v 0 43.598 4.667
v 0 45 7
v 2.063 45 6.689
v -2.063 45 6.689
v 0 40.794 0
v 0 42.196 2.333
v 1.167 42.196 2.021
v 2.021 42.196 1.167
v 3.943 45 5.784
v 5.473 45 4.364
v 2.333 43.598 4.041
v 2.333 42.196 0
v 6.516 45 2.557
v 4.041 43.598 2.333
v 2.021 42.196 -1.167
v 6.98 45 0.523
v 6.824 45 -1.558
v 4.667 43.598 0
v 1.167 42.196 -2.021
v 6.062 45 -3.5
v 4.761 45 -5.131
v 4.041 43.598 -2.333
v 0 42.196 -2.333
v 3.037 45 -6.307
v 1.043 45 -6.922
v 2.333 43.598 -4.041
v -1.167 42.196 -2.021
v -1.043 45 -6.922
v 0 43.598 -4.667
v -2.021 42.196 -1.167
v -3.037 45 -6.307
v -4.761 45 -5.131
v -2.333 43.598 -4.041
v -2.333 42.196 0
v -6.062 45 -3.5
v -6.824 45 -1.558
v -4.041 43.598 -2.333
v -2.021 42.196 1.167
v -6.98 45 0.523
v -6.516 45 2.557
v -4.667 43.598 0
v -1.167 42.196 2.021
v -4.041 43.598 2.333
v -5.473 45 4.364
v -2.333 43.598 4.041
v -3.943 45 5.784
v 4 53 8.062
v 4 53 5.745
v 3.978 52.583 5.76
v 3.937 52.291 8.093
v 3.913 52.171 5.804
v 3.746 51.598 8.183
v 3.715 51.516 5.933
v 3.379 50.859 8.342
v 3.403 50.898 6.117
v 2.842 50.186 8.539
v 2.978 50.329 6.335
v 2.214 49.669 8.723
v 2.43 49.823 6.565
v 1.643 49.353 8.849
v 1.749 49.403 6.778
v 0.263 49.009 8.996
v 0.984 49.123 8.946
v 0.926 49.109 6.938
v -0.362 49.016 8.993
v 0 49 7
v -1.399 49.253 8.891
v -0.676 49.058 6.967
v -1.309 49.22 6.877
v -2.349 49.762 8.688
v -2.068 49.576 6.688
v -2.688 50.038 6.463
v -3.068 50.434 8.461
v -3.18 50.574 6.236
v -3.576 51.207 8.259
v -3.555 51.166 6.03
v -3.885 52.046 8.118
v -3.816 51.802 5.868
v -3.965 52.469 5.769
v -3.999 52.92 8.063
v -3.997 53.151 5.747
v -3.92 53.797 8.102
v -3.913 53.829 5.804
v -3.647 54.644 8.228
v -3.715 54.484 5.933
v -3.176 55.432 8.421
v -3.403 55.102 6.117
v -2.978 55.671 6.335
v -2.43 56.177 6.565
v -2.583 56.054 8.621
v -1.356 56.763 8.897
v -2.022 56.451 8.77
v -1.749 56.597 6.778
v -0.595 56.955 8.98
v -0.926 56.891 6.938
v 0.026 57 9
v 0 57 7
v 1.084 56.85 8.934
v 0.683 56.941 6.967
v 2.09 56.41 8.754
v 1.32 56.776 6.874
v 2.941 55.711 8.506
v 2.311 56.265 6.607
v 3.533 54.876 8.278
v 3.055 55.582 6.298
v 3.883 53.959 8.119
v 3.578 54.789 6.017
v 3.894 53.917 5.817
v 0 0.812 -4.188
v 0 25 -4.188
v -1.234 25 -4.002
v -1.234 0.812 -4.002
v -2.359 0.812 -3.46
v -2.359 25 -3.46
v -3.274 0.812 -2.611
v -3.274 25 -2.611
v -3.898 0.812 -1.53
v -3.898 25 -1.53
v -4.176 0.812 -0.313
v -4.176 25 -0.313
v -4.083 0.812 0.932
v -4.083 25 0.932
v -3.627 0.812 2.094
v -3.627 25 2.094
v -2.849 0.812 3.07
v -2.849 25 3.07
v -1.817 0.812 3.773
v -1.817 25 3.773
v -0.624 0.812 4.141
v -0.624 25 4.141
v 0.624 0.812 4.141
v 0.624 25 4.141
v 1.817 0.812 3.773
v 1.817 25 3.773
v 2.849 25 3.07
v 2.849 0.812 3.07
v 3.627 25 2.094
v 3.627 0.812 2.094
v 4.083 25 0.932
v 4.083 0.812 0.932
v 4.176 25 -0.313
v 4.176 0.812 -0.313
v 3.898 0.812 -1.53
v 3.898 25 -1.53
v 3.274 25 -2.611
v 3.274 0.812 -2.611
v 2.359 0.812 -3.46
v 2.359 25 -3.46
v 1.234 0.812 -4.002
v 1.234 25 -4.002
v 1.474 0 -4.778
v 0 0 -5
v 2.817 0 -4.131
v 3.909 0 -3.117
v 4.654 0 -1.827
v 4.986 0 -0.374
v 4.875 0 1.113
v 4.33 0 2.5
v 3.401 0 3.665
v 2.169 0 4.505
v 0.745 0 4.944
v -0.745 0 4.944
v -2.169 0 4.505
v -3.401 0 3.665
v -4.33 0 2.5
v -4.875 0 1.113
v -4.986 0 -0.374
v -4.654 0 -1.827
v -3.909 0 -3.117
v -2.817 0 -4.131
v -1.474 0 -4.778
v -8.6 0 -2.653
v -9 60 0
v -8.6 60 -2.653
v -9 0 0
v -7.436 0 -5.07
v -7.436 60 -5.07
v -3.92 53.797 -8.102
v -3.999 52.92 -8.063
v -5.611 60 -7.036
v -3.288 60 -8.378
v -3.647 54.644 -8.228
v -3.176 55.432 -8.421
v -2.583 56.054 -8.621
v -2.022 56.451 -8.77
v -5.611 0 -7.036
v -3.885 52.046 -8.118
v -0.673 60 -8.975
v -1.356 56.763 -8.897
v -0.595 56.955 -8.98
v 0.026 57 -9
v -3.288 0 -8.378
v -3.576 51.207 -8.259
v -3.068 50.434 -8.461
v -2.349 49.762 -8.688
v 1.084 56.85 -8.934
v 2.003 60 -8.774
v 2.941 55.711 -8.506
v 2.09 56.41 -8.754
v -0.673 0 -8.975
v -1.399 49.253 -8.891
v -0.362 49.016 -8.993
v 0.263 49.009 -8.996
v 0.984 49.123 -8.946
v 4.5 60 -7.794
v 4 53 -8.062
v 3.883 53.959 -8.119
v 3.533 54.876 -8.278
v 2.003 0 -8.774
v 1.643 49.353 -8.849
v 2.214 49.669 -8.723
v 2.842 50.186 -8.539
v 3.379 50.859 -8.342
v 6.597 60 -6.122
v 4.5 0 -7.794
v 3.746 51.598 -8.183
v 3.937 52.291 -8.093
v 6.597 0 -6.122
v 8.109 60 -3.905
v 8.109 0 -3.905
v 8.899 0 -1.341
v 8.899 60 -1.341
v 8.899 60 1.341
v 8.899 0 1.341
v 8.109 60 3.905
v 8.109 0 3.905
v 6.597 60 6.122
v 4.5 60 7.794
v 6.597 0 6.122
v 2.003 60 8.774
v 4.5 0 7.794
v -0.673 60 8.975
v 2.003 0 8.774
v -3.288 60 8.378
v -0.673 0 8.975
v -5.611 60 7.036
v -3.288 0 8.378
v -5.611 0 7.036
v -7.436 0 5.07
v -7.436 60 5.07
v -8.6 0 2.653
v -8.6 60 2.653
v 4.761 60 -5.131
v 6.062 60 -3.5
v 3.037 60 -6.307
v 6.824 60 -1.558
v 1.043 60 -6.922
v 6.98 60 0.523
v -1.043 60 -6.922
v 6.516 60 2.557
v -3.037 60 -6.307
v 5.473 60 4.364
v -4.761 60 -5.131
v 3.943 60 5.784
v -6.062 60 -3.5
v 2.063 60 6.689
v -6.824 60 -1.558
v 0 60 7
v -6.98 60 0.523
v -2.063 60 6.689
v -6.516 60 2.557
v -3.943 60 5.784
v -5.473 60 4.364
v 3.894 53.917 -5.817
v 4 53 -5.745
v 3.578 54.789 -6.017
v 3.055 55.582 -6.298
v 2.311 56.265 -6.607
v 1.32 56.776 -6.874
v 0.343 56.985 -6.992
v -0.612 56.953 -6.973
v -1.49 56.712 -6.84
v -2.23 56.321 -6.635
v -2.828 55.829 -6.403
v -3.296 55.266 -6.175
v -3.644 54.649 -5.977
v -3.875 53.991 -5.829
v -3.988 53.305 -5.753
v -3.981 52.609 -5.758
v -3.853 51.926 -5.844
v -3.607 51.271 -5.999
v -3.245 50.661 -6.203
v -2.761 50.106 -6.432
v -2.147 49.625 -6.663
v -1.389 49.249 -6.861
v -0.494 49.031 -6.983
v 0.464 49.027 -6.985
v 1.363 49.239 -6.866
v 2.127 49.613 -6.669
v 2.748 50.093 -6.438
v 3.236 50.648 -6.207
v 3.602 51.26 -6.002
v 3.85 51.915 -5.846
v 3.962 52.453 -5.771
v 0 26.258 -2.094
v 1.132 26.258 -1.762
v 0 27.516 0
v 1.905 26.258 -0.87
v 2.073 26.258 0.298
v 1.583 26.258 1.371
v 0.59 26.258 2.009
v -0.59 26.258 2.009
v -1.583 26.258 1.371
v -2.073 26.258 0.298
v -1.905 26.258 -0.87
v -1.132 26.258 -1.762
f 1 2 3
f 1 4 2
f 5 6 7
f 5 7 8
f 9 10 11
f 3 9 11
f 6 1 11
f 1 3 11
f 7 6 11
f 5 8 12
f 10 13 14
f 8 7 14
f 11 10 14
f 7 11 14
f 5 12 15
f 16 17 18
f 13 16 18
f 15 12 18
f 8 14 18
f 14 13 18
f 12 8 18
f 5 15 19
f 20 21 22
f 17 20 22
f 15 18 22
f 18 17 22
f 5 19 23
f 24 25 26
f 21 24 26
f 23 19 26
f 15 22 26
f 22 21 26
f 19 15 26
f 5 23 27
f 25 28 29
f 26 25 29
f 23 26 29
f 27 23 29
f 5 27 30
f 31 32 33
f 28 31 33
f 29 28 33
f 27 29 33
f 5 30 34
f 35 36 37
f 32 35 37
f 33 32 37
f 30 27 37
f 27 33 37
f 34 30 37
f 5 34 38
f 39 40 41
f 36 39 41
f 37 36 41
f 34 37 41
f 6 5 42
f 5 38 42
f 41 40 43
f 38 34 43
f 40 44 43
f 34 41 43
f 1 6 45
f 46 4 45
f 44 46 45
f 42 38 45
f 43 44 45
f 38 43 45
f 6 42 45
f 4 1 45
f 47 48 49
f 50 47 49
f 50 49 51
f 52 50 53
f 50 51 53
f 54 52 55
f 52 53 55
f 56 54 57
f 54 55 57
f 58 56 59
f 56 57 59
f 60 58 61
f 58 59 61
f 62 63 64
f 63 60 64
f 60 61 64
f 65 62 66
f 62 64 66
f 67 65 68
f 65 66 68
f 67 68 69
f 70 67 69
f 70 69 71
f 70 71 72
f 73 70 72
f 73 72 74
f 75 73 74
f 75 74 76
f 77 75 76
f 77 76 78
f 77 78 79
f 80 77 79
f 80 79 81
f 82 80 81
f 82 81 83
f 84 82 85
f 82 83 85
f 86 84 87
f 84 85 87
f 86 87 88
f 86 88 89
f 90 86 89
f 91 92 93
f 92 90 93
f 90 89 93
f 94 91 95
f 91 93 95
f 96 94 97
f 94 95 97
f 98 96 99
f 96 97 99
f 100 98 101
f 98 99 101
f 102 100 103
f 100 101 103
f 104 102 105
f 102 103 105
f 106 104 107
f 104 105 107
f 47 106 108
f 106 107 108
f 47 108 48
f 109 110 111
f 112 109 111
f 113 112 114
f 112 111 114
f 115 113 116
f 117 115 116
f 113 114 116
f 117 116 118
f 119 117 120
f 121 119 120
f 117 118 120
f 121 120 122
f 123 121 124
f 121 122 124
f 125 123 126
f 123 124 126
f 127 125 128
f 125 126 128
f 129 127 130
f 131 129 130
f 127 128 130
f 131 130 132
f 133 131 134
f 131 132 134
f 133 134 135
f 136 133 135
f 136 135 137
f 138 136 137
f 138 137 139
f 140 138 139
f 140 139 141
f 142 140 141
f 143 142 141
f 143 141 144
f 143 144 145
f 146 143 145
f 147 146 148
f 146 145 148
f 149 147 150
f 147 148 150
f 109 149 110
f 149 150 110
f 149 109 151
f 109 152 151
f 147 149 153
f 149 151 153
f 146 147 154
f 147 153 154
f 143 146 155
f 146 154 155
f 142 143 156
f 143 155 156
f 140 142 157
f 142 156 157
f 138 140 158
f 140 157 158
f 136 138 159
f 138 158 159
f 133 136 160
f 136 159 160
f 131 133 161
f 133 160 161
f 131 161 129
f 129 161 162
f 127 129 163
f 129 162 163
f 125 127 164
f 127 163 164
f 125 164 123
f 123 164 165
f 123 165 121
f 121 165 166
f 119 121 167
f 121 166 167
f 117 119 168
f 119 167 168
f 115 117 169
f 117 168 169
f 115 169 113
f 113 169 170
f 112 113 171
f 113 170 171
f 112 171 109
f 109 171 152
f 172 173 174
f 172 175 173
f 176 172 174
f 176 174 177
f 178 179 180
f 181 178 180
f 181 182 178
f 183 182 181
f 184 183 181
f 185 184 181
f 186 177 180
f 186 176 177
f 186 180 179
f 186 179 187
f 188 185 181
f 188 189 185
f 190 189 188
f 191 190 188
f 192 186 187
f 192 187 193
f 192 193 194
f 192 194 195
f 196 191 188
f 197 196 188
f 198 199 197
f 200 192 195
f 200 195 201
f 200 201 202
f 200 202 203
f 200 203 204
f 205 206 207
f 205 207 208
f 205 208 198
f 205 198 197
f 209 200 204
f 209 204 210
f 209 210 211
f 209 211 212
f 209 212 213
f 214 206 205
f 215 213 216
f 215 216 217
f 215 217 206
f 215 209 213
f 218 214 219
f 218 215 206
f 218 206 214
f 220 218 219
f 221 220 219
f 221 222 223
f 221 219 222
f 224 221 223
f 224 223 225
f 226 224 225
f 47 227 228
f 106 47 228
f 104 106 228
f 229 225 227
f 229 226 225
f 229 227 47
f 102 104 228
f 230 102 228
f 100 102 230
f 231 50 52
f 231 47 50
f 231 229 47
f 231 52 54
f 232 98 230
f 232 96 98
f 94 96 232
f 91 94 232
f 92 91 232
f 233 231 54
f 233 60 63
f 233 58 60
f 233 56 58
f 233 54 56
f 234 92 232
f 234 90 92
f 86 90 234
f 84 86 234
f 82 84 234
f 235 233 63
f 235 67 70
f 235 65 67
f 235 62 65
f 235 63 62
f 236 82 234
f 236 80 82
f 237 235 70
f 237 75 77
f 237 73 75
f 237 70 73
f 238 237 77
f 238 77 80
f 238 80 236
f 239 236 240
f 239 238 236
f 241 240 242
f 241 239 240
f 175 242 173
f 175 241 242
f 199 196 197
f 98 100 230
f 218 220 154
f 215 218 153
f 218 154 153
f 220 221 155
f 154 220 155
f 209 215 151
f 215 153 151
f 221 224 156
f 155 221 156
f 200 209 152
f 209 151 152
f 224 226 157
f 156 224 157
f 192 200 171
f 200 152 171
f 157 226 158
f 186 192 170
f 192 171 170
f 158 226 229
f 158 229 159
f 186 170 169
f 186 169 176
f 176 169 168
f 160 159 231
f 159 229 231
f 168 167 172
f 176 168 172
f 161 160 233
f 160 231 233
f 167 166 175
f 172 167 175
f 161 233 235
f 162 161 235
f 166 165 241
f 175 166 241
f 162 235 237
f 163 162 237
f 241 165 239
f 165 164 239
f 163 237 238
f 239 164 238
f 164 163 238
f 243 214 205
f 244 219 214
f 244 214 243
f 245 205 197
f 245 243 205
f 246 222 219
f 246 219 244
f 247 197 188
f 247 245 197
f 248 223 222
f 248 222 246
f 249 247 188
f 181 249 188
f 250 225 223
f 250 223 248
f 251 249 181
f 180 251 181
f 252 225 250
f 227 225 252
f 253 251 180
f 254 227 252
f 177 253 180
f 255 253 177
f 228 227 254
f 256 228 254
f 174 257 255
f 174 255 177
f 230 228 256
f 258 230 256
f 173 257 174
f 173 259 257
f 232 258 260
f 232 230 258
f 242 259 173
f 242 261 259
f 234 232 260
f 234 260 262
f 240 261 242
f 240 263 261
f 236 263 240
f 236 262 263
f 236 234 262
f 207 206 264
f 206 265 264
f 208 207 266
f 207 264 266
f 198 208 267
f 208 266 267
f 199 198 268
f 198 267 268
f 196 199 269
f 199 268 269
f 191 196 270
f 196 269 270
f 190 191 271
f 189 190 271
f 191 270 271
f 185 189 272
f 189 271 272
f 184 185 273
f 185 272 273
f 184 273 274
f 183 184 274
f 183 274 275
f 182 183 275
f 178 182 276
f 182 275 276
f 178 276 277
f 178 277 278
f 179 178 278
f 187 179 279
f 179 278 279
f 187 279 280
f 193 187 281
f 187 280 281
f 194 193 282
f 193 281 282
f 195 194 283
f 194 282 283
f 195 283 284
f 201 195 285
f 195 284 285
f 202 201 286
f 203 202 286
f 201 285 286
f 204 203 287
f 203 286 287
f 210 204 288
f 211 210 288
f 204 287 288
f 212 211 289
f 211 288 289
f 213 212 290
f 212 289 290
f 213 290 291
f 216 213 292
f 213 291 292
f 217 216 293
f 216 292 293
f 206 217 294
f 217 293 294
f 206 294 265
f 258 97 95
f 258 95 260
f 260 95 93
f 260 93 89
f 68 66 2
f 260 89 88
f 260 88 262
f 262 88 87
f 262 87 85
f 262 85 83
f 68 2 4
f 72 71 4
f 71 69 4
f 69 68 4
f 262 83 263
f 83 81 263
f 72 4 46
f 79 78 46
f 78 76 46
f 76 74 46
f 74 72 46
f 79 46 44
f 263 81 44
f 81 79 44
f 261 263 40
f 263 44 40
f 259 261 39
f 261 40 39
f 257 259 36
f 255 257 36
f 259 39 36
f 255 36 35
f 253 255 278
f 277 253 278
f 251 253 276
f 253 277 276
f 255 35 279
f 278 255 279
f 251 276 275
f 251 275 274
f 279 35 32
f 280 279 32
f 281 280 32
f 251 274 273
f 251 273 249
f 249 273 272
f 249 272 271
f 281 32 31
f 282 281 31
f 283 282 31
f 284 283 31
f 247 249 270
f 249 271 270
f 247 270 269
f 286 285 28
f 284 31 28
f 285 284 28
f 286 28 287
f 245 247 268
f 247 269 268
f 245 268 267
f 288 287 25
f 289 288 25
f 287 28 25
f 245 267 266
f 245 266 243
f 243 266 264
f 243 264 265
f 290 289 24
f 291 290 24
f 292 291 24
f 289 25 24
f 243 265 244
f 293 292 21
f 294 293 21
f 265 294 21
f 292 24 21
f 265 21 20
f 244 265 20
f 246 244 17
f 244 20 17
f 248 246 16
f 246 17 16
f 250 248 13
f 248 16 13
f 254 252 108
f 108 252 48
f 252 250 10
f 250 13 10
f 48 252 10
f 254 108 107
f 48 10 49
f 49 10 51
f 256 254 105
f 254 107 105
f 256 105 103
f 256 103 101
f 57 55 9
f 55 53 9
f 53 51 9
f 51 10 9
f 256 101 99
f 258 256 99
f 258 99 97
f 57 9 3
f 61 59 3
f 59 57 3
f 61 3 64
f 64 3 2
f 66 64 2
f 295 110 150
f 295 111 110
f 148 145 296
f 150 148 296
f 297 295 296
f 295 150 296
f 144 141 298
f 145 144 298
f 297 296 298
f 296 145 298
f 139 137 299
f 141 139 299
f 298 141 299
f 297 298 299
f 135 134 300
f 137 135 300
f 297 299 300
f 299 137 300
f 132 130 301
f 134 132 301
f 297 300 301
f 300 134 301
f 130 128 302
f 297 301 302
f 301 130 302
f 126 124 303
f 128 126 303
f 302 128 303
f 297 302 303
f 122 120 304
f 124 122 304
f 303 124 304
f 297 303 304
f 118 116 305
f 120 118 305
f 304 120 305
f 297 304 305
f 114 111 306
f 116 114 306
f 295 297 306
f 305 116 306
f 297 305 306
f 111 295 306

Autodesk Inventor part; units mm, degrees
ref_plane "YZ Plane" through (0, 0, 0) normal (1, 0, 0) x (0, 1, 0)
ref_plane "XZ Plane" through (0, 0, 0) normal (0, 1, 0) x (-1, 0, 0)
ref_plane "XY Plane" through (0, 0, 0) normal (0, 0, 1) x (1, 0, 0)
sketch "Sketch2" plane through (0, 0, 0) normal (0, 1, 0) x (-1, 0, 0)
  circle A0 centre (0, 0) radius 9
  dimension "d2" = 18
extrude "Extrusion2" add sketch "Sketch2" along normal blind 60
hole "Hole1" at (0, 0, 0) direction (0, 1, 0) diameter 8.376 depth 25 tip angle 118 countersink diameter 10 countersink angle 90 thread size "M10x1.5" class "6H" standard "ISO Metric profile"
sketch "Sketch3" plane through (0, 60, 0) normal (0, 1, 0) x (1, 0, 0)
  point P0 (0, 0)
  point P1 (0, 0)
hole "Hole2" at (0, 60, 0) direction (0, -1, 0) diameter 14 depth 15 tip angle 118
sketch "Sketch4" plane through (0, 0, 0) normal (0, 0, 1) x (1, 0, 0)
  circle A0 centre (0, 53) radius 4
  line L0 (9, 60) -> (-9, 60) projected
  point P0 (0, 0)
  point P1 (0, 60)
  dimension "d20" = 8
  dimension "d21" = 7
extrude "Extrusion3" cut sketch "Sketch4" along normal through all both and the other way through all
sketch "Sketch5" plane through (0, 0, 0) normal (0, -1, 0) x (1, 0, 0)
  circle A0 centre (0, 0) radius 9 projected
  line L0 (9, 0) -> (-9, 0)
  line L1 (-9, 0) -> (-9, -9)
  line L2 (-9, -9) -> (9, -9)
  line L3 (9, -9) -> (9, 0)
  dimension "d24" = 18
  dimension "d25" = 9
  dimension "d26" = 9
extrude "Extrusion4" [suppressed]
properties part number "RS-STT-103" material "11 110 (1.0721)"
